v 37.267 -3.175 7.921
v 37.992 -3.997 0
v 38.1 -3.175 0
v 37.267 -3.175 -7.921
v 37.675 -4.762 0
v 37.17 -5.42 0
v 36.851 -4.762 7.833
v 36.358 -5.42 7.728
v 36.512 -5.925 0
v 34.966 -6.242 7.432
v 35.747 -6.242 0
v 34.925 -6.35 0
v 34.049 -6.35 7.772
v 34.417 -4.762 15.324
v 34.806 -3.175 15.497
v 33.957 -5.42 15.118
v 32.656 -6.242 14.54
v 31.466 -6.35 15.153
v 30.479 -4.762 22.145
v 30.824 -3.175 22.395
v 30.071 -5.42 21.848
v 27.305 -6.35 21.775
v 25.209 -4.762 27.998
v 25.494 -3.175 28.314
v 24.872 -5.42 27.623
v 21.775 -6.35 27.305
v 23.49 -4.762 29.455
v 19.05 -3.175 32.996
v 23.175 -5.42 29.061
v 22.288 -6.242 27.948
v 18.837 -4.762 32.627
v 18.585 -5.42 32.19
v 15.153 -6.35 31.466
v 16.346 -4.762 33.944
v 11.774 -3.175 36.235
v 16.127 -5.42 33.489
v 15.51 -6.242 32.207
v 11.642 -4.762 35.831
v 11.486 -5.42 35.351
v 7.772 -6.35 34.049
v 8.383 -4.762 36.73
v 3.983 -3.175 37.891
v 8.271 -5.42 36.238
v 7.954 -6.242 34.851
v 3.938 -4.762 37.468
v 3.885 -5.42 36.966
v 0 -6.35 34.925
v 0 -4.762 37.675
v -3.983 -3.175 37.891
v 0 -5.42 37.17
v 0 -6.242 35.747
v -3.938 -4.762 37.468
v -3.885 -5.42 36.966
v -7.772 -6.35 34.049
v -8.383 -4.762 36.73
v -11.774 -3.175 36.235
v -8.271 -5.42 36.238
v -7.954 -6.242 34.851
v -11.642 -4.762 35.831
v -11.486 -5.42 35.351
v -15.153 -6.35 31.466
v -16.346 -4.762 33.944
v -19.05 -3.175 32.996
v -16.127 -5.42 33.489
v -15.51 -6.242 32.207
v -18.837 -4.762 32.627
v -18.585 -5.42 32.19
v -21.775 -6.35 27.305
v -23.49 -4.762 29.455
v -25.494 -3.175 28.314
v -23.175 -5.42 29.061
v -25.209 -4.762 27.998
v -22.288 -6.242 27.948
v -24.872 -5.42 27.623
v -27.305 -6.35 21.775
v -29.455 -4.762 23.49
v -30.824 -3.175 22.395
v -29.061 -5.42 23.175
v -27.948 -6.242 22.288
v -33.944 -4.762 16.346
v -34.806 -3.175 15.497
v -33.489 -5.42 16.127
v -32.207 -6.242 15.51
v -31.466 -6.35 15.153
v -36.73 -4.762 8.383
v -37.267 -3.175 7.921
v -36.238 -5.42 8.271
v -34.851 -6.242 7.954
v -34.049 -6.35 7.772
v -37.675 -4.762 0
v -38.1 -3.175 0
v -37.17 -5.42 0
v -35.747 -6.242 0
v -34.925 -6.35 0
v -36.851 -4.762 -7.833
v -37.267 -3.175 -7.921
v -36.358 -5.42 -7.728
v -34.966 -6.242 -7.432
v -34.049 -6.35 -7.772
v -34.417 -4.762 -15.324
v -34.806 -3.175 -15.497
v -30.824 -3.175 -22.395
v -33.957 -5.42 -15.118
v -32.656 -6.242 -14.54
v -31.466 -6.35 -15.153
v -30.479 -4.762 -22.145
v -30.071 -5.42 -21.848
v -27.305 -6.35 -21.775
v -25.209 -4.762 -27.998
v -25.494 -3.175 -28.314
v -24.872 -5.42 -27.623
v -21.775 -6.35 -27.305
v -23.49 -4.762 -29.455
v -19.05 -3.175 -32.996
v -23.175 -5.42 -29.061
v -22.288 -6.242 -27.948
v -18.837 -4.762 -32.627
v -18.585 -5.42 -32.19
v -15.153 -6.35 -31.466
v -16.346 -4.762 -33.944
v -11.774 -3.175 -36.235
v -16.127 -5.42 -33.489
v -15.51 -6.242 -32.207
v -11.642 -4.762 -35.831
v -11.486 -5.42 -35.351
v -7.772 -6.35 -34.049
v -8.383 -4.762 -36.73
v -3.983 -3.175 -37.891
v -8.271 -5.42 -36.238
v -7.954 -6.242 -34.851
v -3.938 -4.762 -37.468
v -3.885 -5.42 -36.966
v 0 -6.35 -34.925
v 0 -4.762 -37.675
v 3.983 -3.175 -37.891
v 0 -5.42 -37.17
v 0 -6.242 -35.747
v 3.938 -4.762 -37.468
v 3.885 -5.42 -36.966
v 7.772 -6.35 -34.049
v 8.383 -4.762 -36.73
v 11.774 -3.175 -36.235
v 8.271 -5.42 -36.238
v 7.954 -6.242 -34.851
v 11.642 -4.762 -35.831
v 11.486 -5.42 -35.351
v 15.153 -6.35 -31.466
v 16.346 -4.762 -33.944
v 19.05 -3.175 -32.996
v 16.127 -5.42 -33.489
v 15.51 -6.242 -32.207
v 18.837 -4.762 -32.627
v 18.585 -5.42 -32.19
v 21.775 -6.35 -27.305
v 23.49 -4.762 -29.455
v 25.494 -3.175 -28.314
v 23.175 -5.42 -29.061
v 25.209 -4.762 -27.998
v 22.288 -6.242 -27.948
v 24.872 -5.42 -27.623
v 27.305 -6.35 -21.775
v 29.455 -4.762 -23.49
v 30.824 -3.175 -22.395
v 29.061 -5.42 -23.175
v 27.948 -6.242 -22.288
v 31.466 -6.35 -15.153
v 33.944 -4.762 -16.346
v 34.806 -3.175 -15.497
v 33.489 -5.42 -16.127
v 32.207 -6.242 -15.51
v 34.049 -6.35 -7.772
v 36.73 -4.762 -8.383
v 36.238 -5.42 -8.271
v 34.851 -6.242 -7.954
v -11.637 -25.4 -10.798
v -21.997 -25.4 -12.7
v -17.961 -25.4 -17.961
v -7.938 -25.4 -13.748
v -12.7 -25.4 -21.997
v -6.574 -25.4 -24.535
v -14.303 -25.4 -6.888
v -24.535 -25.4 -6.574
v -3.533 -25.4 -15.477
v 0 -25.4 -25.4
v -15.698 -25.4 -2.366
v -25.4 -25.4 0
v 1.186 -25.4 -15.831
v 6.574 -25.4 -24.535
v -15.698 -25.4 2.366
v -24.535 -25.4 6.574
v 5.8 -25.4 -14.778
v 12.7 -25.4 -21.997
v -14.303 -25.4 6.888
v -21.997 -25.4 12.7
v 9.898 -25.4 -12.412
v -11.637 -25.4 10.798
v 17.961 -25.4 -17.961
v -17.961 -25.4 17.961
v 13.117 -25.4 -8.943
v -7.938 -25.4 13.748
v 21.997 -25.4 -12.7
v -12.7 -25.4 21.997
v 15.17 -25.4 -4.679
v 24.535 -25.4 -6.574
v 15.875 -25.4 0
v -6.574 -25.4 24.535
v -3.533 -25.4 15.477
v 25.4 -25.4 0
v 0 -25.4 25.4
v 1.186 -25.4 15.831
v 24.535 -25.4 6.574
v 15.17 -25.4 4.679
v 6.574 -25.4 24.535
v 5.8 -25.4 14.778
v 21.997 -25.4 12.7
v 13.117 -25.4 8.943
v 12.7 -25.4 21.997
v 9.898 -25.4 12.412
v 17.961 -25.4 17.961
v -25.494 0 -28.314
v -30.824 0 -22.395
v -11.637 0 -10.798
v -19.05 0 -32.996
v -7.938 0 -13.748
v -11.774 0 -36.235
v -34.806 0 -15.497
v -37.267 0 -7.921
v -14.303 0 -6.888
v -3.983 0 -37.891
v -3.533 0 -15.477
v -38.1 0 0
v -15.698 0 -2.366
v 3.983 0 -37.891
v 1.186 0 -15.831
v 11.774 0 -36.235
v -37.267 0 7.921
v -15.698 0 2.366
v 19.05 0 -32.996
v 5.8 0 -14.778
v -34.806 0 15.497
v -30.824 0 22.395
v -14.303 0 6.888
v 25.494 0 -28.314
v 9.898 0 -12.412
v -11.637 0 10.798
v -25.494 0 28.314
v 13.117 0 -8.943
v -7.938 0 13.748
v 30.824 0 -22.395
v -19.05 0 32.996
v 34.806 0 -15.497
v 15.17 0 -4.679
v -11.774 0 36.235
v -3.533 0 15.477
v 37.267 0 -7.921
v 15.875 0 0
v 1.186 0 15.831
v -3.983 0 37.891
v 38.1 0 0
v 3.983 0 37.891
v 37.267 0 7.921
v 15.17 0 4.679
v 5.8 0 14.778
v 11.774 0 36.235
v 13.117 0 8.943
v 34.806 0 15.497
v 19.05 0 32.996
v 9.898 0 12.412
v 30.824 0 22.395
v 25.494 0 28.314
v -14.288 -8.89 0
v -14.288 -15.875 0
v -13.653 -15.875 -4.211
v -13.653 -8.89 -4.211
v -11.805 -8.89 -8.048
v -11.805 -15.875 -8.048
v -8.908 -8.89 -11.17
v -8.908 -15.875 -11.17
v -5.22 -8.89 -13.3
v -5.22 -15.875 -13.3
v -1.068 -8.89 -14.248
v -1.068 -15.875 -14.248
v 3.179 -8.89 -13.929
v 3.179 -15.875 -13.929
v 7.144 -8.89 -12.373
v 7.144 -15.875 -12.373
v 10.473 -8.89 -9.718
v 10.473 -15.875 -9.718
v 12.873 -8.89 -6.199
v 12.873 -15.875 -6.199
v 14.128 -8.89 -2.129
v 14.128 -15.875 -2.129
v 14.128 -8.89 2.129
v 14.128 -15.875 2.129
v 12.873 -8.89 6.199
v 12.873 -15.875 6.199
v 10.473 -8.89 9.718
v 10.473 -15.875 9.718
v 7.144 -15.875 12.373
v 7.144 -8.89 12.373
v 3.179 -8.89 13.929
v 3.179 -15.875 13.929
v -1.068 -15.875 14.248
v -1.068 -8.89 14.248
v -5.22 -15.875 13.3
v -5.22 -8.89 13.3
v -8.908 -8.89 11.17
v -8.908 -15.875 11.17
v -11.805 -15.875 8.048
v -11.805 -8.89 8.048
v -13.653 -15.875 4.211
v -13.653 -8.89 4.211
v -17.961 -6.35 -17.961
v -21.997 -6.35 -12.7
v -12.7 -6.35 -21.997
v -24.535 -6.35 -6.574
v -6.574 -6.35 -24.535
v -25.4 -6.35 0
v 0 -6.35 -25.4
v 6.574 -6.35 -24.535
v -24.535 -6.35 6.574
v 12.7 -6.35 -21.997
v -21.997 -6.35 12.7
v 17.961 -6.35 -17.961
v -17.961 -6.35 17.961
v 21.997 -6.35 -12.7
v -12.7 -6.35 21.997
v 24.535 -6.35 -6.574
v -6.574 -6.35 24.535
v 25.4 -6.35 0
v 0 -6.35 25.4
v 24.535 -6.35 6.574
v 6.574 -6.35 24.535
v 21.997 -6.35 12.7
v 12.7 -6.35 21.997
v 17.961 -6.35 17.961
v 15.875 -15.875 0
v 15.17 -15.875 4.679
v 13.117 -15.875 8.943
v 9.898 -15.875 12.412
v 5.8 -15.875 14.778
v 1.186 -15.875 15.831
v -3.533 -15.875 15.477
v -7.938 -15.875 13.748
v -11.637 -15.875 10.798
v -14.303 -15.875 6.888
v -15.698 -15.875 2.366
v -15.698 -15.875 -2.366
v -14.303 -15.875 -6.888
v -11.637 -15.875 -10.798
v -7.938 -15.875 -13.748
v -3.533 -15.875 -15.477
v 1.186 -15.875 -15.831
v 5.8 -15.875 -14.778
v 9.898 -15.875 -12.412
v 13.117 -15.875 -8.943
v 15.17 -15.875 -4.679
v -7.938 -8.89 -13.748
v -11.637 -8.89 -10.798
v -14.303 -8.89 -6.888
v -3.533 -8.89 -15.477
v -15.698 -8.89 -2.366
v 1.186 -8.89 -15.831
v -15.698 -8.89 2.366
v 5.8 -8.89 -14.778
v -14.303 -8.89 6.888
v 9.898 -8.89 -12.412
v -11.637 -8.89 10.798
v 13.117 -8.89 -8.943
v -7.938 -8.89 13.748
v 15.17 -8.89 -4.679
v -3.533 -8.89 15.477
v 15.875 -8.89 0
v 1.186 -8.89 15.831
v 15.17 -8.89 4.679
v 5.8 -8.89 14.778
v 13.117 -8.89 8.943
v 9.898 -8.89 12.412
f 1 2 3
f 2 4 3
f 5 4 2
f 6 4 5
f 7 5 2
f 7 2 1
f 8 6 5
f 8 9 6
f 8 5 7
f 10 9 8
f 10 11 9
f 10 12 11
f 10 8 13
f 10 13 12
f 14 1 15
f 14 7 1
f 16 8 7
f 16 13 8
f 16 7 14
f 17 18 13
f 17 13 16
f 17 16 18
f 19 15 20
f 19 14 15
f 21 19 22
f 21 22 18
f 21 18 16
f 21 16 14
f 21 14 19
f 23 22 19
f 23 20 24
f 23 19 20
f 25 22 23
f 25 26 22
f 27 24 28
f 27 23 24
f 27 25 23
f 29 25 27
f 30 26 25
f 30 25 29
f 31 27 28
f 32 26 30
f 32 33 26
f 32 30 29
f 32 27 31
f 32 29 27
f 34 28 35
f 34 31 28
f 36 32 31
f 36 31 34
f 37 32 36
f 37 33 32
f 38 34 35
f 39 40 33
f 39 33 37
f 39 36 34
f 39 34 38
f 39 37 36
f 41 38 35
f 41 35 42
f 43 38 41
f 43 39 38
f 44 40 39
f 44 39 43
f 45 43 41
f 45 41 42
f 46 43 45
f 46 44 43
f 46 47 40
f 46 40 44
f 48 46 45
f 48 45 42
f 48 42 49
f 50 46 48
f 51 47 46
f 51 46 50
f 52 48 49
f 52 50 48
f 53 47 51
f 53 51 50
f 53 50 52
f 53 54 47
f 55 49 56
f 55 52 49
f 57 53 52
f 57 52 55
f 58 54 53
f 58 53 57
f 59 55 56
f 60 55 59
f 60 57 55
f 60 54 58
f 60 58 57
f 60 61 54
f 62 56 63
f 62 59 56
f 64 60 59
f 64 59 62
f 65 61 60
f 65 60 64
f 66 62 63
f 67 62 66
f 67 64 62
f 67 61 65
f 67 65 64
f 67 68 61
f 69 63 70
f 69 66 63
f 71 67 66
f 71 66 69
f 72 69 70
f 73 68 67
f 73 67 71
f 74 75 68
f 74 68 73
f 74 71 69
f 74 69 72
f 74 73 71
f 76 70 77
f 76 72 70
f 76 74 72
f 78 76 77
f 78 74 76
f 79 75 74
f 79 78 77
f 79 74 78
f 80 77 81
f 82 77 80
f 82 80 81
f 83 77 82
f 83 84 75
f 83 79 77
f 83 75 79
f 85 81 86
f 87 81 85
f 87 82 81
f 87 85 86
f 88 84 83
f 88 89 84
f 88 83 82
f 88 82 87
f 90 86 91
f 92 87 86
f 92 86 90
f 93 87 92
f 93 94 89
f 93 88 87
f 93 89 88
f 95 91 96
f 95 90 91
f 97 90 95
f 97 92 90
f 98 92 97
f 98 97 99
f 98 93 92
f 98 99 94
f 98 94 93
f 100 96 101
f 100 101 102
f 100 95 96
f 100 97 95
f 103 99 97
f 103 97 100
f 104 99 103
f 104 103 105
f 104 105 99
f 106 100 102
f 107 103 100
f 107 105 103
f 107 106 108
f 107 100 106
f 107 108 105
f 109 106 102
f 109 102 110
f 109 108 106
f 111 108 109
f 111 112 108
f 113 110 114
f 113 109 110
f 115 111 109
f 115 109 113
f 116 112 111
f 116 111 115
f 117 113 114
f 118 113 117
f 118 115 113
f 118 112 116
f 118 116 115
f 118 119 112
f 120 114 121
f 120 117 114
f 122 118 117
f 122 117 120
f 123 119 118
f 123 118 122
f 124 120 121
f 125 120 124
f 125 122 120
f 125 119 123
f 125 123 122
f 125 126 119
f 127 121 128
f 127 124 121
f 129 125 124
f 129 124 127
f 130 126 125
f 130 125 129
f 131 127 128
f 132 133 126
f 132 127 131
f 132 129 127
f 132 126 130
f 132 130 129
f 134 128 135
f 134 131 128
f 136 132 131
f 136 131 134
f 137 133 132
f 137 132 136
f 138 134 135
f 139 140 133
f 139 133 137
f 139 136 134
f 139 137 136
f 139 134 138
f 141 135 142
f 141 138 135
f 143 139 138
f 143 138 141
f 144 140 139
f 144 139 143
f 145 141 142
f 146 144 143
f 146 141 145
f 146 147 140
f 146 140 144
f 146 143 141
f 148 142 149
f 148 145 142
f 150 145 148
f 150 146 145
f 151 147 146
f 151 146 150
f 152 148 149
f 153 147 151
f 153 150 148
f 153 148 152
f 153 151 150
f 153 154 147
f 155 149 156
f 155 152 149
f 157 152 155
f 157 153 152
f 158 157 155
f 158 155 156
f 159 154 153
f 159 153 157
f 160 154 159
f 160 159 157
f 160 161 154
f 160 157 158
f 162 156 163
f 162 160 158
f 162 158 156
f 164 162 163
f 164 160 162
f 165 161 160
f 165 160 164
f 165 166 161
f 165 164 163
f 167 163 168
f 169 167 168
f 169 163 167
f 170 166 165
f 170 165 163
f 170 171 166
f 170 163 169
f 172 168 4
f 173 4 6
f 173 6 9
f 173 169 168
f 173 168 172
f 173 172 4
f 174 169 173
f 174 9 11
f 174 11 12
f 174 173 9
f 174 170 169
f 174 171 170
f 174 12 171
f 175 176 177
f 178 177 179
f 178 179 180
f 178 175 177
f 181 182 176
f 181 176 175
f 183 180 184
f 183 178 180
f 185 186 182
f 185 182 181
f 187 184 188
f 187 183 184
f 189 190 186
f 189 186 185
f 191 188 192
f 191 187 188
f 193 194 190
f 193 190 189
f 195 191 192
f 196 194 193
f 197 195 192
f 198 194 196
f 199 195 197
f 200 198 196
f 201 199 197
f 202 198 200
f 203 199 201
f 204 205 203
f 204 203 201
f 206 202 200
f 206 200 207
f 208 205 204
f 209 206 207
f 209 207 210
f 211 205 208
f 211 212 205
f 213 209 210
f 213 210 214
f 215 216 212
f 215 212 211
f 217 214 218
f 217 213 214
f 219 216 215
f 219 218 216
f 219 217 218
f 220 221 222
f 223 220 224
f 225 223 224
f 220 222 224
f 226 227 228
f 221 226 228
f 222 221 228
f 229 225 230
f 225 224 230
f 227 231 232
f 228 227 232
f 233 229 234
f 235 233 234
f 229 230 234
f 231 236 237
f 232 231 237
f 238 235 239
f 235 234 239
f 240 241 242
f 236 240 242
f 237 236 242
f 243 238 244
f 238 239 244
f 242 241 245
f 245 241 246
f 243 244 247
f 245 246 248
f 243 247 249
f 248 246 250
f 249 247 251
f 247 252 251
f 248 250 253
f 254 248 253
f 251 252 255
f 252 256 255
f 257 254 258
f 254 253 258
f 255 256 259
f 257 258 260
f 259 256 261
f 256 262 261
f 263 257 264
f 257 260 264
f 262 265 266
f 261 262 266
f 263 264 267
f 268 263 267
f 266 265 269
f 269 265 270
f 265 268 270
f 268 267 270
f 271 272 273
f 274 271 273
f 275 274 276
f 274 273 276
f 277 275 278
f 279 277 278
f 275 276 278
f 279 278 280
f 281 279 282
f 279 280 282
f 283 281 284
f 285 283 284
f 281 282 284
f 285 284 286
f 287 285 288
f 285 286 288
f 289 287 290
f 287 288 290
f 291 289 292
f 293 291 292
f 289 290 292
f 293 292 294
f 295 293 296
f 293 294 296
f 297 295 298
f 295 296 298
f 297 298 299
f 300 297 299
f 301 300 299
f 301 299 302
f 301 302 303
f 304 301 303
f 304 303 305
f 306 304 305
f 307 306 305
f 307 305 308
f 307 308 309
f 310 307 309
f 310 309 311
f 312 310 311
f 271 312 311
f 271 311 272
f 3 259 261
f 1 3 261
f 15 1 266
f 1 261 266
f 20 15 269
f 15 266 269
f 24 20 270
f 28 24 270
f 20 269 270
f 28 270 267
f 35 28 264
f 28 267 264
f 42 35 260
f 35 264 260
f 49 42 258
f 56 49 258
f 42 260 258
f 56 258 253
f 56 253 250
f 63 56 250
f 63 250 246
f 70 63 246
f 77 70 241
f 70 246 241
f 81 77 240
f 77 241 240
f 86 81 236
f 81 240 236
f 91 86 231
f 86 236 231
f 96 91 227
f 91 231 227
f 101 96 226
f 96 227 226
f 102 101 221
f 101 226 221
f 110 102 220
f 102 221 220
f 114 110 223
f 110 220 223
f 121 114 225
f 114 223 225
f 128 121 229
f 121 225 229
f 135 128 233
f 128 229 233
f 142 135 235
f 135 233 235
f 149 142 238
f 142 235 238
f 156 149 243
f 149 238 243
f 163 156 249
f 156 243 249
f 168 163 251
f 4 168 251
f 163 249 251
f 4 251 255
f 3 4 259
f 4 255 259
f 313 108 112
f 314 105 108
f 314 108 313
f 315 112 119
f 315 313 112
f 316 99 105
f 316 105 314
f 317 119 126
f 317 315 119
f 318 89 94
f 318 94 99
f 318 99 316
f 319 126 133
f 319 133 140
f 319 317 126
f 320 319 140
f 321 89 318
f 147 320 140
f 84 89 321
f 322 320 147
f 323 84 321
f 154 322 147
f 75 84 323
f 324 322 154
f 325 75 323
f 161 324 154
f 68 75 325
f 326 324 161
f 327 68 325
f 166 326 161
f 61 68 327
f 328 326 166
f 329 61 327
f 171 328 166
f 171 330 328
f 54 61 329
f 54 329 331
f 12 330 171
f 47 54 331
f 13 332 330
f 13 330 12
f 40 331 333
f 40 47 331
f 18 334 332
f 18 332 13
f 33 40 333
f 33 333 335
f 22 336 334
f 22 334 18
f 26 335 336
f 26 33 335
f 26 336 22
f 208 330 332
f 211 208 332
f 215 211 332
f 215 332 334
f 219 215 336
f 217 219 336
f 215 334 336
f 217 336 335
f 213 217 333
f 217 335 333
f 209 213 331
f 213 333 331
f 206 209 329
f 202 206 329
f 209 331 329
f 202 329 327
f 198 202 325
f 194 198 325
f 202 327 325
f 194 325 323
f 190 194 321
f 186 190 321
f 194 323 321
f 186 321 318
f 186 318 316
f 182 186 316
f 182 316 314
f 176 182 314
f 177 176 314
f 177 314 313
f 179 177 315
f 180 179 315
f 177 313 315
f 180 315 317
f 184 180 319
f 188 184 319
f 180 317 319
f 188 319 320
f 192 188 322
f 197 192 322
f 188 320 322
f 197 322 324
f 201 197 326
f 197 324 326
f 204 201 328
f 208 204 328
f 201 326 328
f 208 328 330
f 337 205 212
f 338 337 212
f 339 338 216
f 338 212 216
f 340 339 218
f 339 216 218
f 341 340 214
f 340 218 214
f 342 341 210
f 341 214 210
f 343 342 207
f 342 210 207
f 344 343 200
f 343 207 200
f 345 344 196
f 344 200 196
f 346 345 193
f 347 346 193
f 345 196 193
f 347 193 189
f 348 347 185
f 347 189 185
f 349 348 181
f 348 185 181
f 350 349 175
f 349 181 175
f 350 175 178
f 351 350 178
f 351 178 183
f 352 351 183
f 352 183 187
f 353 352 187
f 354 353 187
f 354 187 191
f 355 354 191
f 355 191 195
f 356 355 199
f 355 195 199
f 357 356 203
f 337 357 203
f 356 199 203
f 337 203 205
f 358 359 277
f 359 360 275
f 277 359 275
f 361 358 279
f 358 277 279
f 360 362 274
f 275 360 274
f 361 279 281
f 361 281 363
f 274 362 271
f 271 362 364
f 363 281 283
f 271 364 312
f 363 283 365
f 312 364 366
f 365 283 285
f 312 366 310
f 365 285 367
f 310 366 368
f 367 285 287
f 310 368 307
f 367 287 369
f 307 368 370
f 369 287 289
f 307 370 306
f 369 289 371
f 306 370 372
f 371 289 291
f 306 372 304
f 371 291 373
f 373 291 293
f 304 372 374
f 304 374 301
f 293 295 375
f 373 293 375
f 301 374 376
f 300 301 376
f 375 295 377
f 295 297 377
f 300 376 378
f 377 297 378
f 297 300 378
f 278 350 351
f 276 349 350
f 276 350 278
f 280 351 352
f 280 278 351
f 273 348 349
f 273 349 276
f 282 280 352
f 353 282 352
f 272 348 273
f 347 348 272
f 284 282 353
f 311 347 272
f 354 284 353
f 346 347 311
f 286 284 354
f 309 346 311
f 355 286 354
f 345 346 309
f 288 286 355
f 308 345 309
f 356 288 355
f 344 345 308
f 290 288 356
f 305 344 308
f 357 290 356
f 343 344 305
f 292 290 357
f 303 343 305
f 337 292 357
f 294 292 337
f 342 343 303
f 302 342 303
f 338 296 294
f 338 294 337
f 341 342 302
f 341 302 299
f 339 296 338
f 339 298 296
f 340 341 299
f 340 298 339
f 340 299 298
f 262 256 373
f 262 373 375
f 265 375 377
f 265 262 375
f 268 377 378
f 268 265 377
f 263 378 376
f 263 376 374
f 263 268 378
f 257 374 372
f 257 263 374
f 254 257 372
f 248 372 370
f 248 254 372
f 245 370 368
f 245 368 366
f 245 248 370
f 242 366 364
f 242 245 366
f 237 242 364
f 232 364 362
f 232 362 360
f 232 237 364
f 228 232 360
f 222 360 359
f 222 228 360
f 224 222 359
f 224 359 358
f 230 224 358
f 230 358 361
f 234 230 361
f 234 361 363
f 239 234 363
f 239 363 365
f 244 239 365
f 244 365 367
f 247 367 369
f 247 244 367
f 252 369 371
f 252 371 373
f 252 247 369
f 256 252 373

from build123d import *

# Parameters (mm, degrees)
F0_R     = 38.1
F1_DEPTH = 6.35
F2_R     = 25.4
F3_DEPTH = 19.05
F5_D     = 28.575
F6_R     = 15.875
F7_DEPTH = 9.525
F8_R     = 3.175
F4_R     = 15.875
F9_DEPTH = 8.89


with BuildPart() as f1:
    # F0 (on Front) → F1 (new body)
    with BuildSketch(Plane.XZ):
        Circle(F0_R)
    extrude(amount=F1_DEPTH)

    # F2 (on face) → F3 (join)
    with BuildSketch(Plane.XZ.offset(6.35)):
        Circle(F2_R)
    extrude(amount=F3_DEPTH)

    # F5 (through all)
    with Locations(Plane(origin=(0, 0, 0), x_dir=(1, 0, 0), z_dir=(0, 1, 0))):
        with Locations((0, 0)):
            Hole(F5_D / 2)

    # F6 (on face) → F7 (cut)
    with BuildSketch(Plane.XZ.offset(25.4)):
        Circle(F6_R)
    extrude(amount=-F7_DEPTH, mode=Mode.SUBTRACT)

    # F8
    f8_edges = [f1.edges().sort_by_distance(p)[0] for p in [
        (-38.1, -6.35, 0),
    ]]
    fillet(f8_edges, radius=F8_R)

    # F4 (on Front) → F9 (cut)
    with BuildSketch(Plane.XZ):
        Circle(F4_R)
    extrude(amount=F9_DEPTH, mode=Mode.SUBTRACT)


solid = f1.part
